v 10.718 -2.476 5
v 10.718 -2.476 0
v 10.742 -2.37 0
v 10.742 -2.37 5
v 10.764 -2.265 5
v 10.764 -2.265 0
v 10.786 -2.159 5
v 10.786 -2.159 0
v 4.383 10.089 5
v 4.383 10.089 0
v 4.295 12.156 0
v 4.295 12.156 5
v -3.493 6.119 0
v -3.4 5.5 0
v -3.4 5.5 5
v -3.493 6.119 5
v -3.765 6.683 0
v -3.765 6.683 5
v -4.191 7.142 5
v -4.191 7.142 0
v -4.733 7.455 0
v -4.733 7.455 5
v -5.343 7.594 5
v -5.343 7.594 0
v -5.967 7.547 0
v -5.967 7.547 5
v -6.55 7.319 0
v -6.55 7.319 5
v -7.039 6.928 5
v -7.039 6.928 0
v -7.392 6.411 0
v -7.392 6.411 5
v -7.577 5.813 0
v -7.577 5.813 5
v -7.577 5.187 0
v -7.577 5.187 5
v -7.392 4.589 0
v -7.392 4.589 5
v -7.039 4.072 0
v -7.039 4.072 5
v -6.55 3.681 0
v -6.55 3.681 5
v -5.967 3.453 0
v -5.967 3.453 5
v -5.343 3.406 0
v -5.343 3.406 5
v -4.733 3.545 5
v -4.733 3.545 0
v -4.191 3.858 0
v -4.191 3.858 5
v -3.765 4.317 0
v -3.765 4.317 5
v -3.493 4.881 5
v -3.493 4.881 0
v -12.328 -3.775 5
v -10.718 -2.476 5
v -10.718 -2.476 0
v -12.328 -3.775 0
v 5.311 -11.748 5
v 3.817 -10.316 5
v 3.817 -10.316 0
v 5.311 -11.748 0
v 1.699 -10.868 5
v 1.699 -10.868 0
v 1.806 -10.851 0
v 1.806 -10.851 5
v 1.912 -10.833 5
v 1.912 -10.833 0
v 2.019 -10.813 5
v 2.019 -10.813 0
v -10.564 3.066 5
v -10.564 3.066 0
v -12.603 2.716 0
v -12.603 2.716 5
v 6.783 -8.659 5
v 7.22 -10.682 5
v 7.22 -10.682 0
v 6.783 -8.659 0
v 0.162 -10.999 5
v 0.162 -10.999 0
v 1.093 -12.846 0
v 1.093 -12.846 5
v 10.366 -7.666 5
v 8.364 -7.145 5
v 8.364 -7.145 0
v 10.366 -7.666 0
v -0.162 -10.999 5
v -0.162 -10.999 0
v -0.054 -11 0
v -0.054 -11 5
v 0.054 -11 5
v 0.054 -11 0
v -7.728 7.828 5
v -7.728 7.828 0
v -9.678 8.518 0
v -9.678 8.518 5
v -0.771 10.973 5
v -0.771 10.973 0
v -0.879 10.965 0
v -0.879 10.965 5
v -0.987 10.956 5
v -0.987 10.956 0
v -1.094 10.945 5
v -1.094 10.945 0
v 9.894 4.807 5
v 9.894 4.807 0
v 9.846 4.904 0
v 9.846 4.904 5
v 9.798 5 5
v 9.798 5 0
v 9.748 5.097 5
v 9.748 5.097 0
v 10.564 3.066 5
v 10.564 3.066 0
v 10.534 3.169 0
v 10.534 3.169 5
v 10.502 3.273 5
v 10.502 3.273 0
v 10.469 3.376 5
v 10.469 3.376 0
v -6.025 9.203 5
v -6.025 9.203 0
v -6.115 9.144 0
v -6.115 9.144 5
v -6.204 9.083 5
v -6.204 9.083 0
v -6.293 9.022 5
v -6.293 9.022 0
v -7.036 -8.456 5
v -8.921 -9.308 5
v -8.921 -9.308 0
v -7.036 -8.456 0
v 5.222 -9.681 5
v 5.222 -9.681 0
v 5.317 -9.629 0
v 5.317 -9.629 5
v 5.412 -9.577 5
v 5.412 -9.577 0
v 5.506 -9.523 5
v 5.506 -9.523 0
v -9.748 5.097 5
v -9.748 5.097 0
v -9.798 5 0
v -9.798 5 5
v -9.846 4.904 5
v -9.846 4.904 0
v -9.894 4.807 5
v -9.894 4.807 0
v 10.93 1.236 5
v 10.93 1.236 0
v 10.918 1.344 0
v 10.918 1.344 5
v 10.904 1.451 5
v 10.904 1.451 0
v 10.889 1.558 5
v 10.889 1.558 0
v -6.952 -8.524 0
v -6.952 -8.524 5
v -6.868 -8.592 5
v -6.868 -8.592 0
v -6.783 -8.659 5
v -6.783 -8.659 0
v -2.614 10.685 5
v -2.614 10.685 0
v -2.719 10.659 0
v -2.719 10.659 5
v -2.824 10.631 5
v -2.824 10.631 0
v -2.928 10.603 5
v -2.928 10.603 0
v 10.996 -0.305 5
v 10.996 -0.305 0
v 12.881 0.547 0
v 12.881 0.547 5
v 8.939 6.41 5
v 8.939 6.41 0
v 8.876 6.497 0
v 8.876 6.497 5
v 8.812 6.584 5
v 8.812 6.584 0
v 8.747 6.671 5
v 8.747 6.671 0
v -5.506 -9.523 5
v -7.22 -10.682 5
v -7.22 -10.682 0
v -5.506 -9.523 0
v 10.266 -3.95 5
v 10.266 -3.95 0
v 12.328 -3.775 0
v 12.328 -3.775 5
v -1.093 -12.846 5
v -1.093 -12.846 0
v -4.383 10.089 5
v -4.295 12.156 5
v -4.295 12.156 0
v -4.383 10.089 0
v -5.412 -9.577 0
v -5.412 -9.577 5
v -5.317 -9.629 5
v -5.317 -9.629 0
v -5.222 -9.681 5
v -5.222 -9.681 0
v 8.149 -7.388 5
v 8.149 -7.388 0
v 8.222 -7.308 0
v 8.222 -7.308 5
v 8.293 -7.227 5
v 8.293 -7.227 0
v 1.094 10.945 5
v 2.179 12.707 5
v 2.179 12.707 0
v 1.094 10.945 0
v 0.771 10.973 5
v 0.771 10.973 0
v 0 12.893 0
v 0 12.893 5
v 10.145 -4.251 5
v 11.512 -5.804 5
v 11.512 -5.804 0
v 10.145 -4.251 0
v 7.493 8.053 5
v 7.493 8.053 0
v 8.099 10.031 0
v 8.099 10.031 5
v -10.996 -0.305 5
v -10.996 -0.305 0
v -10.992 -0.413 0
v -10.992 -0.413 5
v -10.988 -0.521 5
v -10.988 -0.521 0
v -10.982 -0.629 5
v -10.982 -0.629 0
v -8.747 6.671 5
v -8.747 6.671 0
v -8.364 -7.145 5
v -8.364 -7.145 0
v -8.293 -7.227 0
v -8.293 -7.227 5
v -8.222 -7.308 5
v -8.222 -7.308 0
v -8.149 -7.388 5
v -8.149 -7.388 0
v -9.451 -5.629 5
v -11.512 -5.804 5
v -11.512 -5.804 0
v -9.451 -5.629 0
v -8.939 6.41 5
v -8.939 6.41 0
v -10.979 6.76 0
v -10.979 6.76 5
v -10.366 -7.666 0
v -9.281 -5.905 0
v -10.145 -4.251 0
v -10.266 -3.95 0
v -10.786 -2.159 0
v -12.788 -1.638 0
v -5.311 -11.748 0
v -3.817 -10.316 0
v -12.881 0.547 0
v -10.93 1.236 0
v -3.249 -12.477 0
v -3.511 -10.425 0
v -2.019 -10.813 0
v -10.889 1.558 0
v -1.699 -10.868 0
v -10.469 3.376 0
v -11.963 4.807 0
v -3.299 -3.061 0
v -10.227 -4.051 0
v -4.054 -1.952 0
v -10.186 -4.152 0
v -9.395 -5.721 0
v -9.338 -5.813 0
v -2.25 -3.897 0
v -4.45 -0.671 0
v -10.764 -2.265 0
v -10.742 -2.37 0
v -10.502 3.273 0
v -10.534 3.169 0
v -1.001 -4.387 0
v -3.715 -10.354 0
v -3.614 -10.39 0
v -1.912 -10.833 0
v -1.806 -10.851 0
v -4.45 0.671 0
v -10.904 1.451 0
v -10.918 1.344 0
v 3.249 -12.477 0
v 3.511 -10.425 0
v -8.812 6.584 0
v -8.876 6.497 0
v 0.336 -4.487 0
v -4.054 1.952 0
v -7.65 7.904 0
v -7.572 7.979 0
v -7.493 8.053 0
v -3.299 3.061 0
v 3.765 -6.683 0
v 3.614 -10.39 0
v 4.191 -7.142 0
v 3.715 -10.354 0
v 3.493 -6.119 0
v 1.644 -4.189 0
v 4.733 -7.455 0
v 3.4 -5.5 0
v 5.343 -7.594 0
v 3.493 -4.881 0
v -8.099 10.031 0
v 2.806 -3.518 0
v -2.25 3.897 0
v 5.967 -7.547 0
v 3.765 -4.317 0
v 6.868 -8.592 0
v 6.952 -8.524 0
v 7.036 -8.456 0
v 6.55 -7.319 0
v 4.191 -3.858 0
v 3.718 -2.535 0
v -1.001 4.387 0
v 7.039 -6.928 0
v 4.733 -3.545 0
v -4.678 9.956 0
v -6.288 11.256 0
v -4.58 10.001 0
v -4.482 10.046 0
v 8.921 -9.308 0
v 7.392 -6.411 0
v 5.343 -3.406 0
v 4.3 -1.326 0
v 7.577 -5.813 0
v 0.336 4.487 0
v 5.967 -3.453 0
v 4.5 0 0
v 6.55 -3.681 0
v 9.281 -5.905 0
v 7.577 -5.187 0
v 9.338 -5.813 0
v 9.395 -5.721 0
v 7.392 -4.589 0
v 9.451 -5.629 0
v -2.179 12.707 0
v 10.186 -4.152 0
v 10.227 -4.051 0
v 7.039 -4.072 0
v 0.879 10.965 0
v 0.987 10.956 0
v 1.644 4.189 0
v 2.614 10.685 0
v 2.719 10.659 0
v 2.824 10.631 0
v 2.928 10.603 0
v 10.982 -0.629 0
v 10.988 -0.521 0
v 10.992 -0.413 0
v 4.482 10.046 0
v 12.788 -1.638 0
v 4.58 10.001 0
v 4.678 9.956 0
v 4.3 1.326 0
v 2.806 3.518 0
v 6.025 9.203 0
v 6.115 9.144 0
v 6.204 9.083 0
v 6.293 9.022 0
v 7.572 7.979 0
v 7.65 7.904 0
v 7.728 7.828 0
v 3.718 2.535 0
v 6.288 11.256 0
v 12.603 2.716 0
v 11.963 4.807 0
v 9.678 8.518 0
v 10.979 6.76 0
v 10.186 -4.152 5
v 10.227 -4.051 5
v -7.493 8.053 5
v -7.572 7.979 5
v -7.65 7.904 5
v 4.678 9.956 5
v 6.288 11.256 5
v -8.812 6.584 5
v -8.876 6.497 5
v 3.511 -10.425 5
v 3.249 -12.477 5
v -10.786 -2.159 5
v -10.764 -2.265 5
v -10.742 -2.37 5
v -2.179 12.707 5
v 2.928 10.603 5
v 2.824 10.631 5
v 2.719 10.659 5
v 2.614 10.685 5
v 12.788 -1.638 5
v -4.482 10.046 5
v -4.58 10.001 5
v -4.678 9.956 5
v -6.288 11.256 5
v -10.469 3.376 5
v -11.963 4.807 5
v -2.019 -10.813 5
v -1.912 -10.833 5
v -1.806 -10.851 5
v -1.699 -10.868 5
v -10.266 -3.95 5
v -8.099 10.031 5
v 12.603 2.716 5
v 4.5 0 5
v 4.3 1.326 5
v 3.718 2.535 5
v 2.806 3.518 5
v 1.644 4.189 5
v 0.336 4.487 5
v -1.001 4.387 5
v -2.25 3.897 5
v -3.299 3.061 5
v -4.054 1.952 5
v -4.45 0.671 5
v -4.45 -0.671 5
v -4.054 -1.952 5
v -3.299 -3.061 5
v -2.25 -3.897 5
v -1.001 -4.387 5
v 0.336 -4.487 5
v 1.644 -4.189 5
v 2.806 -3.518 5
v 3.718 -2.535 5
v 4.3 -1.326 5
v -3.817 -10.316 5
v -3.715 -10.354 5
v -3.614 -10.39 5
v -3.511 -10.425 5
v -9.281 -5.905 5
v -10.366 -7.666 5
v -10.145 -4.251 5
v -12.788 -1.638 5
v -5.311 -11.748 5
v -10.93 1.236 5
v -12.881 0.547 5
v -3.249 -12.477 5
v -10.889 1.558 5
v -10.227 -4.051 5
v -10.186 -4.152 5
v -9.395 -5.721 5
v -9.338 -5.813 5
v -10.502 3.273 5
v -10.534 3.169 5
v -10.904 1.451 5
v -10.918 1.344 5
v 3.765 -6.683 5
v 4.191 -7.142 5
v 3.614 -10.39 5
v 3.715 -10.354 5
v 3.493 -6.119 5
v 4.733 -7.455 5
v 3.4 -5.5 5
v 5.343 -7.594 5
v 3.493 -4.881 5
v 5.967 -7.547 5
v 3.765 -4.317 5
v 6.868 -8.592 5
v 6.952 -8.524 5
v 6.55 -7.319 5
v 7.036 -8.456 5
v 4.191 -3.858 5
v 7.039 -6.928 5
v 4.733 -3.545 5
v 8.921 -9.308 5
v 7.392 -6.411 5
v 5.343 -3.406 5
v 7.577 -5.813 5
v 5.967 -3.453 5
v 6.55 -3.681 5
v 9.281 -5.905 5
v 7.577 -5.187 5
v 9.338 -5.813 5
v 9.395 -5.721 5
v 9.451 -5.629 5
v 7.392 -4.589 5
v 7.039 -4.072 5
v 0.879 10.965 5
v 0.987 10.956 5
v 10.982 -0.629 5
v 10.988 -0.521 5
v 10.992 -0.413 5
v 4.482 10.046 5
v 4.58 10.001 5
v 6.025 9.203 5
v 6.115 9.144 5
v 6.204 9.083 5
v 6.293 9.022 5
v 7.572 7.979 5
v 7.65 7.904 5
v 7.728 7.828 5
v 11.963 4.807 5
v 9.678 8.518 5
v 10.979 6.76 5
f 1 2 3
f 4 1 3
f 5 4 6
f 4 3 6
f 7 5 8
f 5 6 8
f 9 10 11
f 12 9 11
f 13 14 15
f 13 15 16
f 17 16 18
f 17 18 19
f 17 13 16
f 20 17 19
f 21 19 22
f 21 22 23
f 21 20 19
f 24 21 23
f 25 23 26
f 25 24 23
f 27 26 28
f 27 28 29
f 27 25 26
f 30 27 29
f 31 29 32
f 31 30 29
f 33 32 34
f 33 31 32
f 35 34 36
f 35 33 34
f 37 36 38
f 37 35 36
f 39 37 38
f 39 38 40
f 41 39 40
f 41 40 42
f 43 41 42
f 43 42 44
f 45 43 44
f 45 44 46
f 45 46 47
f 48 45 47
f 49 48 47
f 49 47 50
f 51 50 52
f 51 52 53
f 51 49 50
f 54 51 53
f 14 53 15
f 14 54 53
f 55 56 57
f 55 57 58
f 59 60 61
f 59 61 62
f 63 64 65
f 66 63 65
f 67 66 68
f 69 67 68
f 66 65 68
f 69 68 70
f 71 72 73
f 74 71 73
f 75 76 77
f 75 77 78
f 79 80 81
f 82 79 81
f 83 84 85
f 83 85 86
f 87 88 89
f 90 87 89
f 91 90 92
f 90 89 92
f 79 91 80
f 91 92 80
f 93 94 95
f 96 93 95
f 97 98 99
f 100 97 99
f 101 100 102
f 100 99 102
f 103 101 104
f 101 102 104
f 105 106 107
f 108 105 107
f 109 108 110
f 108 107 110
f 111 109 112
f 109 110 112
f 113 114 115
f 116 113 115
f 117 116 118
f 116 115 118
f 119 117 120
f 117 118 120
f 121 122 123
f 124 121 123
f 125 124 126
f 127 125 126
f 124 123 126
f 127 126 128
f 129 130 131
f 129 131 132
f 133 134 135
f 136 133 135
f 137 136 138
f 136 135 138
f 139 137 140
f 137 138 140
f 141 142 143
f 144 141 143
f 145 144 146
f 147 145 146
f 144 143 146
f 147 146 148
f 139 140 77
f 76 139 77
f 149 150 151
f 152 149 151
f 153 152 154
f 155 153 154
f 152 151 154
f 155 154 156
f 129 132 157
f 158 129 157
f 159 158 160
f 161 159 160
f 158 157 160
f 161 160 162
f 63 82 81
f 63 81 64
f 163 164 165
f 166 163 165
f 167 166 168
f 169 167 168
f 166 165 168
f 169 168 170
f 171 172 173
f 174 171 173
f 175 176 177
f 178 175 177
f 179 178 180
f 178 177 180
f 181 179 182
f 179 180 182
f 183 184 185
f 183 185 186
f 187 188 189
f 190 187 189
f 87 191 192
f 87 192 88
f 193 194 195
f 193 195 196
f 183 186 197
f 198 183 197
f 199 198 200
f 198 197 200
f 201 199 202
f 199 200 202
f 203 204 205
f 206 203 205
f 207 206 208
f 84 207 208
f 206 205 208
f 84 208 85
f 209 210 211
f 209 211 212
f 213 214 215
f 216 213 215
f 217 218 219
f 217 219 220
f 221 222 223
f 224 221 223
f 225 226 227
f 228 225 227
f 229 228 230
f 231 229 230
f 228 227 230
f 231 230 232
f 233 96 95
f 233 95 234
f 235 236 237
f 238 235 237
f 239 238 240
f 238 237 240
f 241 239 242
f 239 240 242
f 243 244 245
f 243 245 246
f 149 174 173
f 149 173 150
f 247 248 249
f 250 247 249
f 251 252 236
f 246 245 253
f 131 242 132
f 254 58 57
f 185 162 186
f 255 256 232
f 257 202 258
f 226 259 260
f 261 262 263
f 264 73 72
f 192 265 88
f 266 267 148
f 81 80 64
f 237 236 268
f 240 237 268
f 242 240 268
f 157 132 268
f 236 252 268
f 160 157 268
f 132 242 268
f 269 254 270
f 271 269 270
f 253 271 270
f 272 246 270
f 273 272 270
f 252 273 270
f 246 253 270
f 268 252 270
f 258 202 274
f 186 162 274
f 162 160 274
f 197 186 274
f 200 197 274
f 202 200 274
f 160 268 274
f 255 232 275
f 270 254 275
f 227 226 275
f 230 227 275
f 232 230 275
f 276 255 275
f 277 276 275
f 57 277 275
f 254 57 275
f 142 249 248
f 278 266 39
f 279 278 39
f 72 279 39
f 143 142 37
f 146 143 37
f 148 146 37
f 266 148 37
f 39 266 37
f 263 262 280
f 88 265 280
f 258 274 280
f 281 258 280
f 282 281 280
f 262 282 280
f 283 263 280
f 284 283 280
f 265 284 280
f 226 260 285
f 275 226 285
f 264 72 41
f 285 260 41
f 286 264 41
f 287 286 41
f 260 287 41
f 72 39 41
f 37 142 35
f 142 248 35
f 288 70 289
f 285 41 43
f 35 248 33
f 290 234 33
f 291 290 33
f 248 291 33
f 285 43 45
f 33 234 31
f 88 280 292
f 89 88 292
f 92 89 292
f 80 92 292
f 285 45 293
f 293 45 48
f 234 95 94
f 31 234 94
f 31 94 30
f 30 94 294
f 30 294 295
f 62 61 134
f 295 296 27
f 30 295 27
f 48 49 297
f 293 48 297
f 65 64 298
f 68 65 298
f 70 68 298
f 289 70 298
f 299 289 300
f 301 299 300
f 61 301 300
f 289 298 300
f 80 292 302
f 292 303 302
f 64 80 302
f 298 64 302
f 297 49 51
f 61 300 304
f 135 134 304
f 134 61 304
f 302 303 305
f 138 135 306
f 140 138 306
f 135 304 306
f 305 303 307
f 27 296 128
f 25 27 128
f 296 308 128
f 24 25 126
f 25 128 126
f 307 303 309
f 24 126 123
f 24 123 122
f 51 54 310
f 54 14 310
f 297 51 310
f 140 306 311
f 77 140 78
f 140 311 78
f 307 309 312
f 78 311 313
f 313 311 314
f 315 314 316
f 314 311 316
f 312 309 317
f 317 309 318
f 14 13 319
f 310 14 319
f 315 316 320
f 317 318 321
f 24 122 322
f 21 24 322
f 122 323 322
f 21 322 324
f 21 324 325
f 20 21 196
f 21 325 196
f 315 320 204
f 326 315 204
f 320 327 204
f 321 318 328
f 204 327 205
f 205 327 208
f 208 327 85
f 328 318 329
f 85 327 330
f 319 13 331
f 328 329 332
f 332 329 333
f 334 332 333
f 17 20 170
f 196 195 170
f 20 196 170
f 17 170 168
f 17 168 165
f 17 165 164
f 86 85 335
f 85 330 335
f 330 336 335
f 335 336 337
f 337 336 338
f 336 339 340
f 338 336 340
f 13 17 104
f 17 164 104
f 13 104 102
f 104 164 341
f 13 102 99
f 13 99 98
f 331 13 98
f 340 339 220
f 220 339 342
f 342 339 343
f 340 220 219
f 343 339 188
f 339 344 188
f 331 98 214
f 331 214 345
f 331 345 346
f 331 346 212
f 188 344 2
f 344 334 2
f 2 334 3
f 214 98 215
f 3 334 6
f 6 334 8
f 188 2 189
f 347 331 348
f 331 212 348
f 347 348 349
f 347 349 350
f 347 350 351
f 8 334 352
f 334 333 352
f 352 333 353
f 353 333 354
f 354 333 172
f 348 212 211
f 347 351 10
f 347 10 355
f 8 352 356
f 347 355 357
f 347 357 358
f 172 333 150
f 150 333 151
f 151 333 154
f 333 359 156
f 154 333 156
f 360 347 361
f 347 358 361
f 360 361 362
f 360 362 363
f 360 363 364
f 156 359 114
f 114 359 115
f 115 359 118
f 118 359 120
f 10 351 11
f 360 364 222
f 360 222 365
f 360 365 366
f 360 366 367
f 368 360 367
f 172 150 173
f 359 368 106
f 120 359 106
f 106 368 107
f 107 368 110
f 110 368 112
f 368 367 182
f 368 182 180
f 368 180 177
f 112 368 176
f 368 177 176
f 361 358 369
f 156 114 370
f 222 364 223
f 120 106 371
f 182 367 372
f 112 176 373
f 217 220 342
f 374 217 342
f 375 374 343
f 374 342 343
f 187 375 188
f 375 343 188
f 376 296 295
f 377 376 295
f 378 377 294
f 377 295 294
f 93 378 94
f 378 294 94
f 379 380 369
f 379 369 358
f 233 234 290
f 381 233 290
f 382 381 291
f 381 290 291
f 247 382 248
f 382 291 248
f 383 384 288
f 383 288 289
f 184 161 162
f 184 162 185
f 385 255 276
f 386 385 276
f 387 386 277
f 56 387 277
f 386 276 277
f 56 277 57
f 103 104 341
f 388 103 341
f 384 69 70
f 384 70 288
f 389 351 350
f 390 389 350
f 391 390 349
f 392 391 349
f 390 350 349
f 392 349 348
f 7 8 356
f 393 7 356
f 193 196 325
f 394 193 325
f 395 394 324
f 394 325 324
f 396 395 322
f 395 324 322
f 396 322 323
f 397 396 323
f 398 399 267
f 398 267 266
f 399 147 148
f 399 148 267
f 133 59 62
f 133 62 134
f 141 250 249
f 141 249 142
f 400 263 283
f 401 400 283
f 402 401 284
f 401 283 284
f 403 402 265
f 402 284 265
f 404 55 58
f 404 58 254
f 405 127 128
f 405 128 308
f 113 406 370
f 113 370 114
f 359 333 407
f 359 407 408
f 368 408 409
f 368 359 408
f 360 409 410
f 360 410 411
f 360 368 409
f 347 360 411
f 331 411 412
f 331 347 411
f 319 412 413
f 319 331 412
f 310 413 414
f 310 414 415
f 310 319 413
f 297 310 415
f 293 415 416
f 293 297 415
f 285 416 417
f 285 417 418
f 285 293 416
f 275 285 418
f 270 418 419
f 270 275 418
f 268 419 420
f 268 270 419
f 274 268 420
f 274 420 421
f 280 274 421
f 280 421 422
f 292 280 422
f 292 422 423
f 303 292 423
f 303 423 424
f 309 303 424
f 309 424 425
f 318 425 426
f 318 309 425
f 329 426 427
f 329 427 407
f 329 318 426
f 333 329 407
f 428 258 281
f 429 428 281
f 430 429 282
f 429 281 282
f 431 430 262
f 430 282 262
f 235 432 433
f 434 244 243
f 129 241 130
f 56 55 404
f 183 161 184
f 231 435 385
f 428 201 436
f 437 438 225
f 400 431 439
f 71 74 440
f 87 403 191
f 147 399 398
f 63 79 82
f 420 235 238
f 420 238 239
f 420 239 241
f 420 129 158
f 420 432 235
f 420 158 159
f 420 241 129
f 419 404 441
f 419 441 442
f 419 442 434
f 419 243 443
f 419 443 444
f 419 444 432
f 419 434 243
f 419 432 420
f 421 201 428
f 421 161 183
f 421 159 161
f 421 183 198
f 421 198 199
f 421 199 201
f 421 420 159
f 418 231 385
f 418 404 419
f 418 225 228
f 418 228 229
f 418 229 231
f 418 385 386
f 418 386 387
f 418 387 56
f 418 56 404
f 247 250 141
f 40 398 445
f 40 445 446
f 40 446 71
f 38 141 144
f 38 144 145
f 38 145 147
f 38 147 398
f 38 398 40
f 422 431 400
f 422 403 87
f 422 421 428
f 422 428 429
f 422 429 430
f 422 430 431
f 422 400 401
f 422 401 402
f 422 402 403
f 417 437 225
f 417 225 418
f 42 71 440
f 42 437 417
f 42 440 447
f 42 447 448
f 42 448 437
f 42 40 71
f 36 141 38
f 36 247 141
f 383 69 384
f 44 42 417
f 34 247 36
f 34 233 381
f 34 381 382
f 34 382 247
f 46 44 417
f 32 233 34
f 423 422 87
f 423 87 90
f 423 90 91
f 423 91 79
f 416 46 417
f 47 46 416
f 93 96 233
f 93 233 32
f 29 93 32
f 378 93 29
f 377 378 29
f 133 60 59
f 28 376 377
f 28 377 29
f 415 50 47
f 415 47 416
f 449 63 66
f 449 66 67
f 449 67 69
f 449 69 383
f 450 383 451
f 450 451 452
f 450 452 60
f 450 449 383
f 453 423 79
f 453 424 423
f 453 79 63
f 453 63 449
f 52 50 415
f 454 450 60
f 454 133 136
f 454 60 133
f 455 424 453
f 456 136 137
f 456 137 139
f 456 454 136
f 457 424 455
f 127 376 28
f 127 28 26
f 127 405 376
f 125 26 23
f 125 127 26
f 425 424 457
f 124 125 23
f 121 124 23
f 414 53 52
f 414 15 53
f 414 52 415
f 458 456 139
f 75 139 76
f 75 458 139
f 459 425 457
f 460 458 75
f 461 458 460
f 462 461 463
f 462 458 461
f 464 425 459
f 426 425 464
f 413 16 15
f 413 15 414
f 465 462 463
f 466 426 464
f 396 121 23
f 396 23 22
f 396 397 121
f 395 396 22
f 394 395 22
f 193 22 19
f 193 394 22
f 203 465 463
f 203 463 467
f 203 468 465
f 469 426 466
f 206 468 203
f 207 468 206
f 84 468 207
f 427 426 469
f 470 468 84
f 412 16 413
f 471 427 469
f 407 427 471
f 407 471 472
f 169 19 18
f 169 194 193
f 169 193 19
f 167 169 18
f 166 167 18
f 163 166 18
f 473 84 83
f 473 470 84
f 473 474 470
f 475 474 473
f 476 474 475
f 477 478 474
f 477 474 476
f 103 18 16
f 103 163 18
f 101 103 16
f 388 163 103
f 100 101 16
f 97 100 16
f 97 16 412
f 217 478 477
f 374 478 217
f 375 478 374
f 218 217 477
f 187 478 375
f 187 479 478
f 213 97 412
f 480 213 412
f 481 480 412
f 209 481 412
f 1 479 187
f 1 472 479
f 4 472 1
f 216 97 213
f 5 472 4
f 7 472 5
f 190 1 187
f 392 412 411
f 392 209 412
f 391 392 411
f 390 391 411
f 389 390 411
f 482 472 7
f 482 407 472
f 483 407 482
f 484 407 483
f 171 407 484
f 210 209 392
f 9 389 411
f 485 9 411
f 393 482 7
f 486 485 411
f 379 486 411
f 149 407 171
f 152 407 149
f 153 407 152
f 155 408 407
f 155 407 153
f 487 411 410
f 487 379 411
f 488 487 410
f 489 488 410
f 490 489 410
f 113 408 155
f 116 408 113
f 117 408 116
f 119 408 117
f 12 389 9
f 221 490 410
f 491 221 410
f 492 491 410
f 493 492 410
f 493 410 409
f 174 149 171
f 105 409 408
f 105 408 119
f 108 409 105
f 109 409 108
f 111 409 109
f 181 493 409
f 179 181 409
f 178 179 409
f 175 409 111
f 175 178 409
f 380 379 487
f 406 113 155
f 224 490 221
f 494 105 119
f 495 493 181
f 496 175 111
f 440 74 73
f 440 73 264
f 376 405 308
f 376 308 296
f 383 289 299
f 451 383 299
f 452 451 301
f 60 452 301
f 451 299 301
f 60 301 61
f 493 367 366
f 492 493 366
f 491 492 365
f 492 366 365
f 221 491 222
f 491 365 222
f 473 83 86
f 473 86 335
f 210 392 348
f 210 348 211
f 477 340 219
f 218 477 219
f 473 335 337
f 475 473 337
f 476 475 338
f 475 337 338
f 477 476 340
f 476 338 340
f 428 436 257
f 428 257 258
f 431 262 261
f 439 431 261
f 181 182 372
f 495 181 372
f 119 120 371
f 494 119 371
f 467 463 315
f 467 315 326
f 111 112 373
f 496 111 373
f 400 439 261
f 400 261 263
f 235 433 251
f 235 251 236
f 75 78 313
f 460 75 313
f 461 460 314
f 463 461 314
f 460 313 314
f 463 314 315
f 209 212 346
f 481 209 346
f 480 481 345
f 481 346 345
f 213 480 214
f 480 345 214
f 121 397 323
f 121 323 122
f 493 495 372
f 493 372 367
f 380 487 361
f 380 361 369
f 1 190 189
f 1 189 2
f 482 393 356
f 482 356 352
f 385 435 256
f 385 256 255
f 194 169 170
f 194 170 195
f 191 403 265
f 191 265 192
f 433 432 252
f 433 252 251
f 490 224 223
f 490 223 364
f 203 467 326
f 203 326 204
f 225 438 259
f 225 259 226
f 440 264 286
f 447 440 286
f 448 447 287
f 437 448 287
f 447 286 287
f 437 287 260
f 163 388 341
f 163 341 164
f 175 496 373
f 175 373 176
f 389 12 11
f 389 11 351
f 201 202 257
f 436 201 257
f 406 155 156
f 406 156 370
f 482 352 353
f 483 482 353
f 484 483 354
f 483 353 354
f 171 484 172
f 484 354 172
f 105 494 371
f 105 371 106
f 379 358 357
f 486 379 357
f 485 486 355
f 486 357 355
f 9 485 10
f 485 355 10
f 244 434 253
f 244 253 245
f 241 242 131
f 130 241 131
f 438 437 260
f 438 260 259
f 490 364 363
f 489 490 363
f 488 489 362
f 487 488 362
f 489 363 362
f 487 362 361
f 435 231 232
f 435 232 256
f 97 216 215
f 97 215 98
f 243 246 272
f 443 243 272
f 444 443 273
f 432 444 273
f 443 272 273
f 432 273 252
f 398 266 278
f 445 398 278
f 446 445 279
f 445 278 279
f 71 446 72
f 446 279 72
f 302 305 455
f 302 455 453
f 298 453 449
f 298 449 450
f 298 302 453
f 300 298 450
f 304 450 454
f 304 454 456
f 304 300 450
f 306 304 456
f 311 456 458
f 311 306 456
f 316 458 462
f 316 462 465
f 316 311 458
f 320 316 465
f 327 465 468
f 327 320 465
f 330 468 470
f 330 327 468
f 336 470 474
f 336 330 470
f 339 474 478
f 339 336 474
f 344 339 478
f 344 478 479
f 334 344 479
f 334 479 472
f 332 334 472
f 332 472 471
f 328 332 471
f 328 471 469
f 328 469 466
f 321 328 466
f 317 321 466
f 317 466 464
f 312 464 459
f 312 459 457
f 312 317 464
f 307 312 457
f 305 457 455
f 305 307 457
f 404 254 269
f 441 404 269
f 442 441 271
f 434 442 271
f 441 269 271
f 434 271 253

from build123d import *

# Parameters (mm, degrees)
ESQUISSE1_R                  = 11
ESQUISSE1_R_2                = 4.5
ESQUISSE1_R_3                = 2.1
BOSS_EXTRU_1_DEPTH           = 5
BOSS_EXTRU_2_DEPTH           = 5
R_P_TITION_CIRCULAIRE1_COUNT = 37


with BuildPart() as part:
    # Esquisse1 → Boss.-Extru.1 (new body)
    with BuildSketch(Plane.XY):
        Circle(ESQUISSE1_R)
        Circle(ESQUISSE1_R_2, mode=Mode.SUBTRACT)
        with Locations((-5.5, 5.5)):
            Circle(ESQUISSE1_R_3, mode=Mode.SUBTRACT)
        with Locations(Location((5.5, -5.5, 0), (0, 0, 180))):
            Circle(ESQUISSE1_R_3, mode=Mode.SUBTRACT)
    extrude(amount=BOSS_EXTRU_1_DEPTH)

    # Esquisse2 → Boss.-Extru.2 (add)
    with BuildSketch(Plane.XY.offset(5)):
        Polygon((0, 12.892709197), (-0.883743736, 10.692594879), (0.883743736, 10.692594879), align=None)
    boss_extru_2 = extrude(amount=-BOSS_EXTRU_2_DEPTH)

    # Répétition circulaire1: Boss.-Extru.2 ×37 about axis
    r_p_tition_circulaire1_axis = Axis((0, 0, 0), (0, 0, 1))
    for i in range(1, R_P_TITION_CIRCULAIRE1_COUNT):
        add(boss_extru_2.rotate(r_p_tition_circulaire1_axis, i * 360 / R_P_TITION_CIRCULAIRE1_COUNT))


solid = part.part
